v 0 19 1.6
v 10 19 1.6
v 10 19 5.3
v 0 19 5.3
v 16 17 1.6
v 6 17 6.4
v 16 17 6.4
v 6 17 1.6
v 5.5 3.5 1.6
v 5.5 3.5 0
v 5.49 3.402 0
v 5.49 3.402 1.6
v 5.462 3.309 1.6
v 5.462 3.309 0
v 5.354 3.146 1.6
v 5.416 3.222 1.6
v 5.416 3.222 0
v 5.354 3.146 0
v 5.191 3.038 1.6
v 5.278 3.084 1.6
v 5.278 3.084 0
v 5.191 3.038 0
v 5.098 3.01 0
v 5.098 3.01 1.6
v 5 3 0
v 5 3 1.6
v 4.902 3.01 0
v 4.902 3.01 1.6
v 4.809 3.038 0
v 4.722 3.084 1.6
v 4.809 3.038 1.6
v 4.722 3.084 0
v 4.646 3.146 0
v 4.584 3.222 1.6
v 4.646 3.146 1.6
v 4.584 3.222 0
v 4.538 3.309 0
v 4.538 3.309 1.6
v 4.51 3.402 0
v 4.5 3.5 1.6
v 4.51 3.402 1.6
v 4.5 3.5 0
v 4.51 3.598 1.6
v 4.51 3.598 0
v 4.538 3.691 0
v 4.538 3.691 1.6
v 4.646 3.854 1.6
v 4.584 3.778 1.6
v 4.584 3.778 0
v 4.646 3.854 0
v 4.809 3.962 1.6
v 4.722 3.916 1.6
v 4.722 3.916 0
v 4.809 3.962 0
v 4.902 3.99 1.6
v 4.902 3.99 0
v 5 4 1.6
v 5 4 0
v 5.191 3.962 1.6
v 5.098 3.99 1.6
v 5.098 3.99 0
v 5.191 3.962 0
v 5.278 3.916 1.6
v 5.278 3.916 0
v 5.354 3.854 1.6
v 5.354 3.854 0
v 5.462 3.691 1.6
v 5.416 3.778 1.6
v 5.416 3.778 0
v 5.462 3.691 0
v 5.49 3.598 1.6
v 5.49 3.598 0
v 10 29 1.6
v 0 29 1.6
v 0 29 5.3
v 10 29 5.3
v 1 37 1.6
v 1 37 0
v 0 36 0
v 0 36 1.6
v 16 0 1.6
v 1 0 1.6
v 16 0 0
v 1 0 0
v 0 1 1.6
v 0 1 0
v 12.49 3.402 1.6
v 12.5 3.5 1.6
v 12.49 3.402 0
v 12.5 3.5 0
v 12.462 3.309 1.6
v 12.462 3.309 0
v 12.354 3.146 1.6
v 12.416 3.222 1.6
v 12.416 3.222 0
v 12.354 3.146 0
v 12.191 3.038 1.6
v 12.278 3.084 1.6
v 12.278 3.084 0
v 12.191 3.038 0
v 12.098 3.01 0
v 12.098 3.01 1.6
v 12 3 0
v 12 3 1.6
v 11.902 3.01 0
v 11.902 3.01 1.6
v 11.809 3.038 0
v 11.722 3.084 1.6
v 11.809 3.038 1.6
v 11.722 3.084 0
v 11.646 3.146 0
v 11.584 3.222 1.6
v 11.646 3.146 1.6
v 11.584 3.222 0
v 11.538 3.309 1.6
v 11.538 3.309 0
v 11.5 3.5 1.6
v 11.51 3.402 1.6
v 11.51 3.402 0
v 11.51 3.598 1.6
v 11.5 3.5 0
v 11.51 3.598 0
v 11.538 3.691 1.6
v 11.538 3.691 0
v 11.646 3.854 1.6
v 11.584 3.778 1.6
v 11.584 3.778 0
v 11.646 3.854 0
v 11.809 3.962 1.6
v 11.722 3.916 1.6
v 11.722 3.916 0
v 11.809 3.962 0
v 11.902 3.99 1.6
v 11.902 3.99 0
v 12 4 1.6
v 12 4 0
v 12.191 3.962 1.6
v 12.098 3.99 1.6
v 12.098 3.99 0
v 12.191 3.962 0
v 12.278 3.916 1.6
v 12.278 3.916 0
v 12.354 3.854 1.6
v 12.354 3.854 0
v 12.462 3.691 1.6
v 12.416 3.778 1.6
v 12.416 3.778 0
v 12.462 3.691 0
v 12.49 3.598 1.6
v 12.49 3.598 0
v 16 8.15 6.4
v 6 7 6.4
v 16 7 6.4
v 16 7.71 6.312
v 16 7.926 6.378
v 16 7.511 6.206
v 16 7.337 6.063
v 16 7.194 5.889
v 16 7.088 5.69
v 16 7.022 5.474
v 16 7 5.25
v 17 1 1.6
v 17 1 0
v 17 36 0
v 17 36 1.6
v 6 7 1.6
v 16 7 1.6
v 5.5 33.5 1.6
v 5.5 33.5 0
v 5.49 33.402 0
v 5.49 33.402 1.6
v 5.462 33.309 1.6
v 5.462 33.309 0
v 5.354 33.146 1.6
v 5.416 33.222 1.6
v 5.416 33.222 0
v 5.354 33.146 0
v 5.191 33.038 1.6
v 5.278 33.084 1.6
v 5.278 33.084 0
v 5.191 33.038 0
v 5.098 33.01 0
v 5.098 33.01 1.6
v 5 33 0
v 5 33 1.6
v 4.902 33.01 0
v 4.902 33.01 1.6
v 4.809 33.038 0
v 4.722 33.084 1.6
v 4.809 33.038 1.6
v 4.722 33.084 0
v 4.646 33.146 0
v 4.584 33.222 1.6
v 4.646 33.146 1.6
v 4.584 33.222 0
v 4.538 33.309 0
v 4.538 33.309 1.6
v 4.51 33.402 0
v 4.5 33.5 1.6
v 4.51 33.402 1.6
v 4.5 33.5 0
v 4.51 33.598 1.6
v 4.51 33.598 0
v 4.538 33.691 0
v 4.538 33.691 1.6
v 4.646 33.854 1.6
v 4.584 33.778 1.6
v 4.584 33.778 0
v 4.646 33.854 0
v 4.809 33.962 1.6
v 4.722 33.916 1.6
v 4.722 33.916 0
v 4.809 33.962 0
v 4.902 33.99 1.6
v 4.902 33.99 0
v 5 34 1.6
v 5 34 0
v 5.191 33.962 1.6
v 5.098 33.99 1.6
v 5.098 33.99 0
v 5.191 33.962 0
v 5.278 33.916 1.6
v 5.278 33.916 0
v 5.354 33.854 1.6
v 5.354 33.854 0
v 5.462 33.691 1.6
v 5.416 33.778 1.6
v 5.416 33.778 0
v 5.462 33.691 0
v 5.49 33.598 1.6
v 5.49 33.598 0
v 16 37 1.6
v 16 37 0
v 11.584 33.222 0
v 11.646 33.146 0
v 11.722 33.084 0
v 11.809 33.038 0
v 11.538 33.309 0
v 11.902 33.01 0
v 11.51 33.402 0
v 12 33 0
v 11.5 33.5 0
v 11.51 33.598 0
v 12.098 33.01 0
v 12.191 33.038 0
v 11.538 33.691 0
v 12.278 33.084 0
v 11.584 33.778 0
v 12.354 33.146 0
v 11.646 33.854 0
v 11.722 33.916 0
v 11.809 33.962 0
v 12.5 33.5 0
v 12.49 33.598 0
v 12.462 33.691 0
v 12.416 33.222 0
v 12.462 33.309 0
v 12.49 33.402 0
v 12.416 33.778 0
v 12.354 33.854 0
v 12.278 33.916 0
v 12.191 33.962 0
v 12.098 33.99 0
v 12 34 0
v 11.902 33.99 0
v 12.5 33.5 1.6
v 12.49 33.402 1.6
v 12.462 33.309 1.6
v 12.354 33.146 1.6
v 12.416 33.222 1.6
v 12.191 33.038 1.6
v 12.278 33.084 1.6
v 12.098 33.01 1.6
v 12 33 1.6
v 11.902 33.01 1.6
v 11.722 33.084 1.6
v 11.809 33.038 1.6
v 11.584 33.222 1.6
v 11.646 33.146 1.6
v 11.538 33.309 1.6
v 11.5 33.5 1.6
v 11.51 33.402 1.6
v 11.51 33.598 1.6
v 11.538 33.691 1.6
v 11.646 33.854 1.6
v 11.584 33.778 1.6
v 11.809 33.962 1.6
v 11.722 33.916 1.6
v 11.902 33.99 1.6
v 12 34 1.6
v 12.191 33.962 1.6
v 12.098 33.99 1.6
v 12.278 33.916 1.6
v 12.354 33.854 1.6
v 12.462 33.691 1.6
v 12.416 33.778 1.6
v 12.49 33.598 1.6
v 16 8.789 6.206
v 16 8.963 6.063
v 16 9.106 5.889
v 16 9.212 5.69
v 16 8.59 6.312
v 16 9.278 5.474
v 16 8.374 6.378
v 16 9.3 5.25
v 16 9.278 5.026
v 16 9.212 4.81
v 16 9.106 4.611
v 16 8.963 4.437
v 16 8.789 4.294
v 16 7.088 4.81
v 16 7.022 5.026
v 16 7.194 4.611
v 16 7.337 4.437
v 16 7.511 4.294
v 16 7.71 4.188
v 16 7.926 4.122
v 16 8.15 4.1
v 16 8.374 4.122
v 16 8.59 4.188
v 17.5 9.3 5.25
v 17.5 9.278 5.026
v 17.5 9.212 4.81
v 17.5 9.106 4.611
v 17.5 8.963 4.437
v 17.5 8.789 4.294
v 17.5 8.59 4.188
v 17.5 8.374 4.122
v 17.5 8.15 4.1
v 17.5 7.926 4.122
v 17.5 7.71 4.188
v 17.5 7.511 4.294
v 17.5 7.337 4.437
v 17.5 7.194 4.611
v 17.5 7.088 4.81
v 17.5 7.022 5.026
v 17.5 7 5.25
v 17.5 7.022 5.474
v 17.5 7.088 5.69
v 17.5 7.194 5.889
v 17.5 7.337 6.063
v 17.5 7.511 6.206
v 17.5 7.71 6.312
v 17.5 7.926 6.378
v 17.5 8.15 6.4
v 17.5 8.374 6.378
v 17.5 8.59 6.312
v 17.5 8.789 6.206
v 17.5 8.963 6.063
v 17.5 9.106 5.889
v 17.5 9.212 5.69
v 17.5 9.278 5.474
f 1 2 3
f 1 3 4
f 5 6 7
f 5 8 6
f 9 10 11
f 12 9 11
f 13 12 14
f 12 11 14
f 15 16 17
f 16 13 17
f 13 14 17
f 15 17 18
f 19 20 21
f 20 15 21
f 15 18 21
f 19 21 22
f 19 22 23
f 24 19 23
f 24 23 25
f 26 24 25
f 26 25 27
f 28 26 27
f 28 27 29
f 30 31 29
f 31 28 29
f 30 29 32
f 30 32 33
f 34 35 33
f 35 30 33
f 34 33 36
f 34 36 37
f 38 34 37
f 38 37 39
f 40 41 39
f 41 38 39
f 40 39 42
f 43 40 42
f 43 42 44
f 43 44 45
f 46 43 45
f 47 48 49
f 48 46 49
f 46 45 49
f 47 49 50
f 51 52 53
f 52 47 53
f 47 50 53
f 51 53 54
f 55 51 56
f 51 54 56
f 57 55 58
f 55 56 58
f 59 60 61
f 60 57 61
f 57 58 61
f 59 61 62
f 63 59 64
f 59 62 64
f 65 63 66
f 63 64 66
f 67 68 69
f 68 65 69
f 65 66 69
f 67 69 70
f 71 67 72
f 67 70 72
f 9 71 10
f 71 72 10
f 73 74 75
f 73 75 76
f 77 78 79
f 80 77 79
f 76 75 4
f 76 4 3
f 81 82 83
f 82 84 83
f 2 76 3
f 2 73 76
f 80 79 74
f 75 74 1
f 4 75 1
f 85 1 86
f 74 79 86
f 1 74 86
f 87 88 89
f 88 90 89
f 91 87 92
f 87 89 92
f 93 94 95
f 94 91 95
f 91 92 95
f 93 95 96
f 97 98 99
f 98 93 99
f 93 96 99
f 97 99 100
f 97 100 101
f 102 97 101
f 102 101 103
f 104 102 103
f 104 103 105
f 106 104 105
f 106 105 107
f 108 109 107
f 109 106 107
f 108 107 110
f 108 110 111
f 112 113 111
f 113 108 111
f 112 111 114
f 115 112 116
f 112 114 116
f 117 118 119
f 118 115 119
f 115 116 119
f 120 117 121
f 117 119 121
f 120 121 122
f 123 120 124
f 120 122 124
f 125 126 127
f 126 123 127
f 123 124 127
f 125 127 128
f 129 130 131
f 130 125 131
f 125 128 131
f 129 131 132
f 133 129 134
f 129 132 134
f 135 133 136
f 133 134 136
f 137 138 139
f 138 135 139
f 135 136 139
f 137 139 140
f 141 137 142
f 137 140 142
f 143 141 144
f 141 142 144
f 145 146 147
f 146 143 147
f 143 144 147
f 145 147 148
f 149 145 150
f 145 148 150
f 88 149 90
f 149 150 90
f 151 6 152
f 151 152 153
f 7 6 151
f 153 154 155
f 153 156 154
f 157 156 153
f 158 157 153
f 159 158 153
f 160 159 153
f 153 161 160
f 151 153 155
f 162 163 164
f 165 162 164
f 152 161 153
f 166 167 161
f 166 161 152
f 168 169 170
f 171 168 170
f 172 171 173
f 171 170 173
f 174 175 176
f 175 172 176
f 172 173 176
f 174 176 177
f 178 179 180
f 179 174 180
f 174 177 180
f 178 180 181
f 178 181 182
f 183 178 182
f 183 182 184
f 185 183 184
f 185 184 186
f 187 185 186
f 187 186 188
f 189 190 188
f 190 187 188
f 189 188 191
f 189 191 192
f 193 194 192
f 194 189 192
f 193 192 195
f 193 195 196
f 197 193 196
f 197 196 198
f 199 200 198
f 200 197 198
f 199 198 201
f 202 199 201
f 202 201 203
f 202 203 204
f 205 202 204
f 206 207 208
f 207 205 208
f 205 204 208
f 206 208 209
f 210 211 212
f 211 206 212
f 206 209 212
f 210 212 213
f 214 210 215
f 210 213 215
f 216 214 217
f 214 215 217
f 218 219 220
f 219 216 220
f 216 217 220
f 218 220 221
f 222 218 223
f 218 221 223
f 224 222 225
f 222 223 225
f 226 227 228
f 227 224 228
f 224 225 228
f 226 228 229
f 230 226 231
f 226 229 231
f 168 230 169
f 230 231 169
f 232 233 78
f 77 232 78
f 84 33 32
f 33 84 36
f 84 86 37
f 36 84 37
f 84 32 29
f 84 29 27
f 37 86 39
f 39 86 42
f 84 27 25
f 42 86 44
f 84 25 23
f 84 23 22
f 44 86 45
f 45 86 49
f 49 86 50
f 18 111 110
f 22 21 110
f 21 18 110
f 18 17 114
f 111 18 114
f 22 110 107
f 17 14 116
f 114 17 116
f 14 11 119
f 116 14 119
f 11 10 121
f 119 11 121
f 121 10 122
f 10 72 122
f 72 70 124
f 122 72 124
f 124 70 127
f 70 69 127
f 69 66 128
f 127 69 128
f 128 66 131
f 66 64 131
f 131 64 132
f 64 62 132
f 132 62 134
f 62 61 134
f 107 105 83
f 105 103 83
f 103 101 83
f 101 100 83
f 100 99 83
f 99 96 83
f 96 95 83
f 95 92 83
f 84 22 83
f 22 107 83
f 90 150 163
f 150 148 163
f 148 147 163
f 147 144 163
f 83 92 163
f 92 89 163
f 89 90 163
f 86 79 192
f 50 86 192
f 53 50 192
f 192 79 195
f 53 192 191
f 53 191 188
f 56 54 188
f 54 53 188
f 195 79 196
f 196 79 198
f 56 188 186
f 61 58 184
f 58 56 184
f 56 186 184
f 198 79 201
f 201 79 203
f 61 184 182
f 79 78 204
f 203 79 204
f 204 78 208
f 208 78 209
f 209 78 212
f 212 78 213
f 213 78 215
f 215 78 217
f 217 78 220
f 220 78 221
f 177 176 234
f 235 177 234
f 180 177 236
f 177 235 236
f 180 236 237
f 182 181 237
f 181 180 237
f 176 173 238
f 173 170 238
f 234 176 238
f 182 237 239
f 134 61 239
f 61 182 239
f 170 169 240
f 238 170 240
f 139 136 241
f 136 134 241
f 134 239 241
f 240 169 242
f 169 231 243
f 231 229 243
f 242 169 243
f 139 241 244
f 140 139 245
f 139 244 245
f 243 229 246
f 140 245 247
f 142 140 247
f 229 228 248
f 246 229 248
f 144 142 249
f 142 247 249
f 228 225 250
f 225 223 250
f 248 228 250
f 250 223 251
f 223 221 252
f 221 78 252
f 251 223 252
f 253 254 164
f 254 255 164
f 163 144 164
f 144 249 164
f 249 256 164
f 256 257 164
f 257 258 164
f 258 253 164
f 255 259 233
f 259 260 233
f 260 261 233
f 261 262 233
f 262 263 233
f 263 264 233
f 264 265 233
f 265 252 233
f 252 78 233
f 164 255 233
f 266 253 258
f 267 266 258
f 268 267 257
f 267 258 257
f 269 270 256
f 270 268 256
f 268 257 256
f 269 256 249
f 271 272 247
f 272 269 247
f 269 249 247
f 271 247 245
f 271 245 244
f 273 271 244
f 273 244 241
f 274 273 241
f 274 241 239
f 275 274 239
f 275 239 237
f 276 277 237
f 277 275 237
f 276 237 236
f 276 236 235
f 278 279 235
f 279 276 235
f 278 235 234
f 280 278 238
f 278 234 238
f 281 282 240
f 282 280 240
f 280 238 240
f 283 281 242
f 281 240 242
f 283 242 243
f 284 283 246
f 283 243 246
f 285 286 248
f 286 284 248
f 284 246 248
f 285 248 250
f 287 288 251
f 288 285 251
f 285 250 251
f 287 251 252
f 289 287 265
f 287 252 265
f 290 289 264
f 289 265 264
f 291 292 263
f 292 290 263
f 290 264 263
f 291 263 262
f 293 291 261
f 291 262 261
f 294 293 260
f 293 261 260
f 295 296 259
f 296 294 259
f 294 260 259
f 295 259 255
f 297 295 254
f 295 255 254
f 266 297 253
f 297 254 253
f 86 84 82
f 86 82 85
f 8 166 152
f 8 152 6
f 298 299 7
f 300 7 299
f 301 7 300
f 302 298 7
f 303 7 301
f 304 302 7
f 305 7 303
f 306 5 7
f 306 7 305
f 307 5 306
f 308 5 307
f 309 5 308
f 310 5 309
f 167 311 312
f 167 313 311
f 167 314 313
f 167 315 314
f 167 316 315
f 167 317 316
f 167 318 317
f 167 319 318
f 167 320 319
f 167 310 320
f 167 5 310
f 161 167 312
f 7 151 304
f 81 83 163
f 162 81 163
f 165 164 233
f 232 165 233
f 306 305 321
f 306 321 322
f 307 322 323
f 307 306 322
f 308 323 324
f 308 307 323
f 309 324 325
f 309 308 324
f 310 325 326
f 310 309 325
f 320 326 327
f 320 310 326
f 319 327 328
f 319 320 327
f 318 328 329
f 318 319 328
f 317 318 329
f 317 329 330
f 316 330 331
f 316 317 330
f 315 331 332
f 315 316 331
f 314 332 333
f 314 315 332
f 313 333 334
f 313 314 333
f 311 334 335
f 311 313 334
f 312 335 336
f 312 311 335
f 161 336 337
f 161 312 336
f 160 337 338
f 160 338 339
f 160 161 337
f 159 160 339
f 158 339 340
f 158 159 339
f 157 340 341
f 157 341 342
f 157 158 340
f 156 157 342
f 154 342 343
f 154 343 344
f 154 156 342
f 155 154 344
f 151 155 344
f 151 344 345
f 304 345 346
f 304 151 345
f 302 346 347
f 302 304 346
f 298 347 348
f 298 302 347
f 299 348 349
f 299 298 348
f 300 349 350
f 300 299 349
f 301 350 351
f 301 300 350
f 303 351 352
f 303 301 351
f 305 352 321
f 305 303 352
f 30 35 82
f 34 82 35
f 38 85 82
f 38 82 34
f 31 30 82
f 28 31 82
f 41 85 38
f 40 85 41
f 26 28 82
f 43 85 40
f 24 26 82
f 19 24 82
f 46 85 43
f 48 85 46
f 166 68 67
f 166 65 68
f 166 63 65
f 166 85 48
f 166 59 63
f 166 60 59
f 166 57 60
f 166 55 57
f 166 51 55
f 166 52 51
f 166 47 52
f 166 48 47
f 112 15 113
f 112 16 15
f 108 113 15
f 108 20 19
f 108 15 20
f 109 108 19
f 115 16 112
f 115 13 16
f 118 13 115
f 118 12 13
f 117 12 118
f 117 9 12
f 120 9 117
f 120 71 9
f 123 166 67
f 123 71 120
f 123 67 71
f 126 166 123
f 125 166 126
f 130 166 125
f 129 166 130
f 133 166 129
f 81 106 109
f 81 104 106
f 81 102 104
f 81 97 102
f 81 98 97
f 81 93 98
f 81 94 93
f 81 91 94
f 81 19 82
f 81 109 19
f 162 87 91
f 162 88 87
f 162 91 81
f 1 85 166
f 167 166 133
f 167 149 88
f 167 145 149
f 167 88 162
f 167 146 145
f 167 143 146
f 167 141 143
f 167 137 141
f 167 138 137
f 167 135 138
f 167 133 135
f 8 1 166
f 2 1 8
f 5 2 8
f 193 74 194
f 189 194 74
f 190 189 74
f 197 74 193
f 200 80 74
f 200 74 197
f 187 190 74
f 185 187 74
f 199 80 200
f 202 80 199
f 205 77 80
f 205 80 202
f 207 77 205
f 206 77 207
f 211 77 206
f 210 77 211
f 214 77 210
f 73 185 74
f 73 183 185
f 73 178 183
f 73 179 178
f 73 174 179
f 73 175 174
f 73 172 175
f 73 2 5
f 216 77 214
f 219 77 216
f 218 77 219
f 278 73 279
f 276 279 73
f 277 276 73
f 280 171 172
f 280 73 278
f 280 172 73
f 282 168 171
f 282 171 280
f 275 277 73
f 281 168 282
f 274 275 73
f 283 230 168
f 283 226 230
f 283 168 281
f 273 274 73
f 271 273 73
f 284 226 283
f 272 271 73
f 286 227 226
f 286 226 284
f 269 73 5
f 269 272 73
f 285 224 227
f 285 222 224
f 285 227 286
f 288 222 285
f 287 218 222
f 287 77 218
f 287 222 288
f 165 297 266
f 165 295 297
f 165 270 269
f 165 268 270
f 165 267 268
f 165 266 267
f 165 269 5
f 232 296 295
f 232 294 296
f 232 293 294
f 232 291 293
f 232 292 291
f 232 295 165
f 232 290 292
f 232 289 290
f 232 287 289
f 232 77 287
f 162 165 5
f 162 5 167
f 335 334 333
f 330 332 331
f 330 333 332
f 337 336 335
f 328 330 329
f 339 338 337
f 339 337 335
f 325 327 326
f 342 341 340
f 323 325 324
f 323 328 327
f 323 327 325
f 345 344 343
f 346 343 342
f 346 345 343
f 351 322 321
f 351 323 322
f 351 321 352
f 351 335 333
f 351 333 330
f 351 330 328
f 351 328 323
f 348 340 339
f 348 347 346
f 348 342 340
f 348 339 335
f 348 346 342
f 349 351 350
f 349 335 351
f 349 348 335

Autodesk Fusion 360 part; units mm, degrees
sketch "Skizze1" plane through (0, 0, 0) normal (0, 0, 1) x (1, 0, 0)
  line L0 (2.5, 0) -> (15.28, 0)
  line L1 (17.78, 2.5) -> (17.78, 16.55)
  line L2 (15.28, 19.05) -> (2.5, 19.05)
  line L3 (0, 16.55) -> (0, 2.5)
  arc A0 (2.5, 19.05) -> (0, 16.55) centre (2.5, 16.55) ccw
  arc A1 (17.78, 16.55) -> (15.28, 19.05) centre (15.28, 16.55) ccw
  arc A2 (15.28, 0) -> (17.78, 2.5) centre (15.28, 2.5) ccw
  arc A3 (0, 2.5) -> (2.5, 0) centre (2.5, 2.5) ccw
  circle A4 centre (2.5, 16.55) radius 1
  circle A5 centre (15.2, 16.55) radius 1
  circle A6 centre (0.89, 2.5) radius 0.5
  circle A7 centre (3.5567, 2.5) radius 0.5
  circle A8 centre (6.2233, 2.5) radius 0.5
  circle A9 centre (8.89, 2.5) radius 0.5
  circle A10 centre (11.5567, 2.5) radius 0.5
  circle A11 centre (14.2233, 2.5) radius 0.5
  circle A12 centre (16.89, 2.5) radius 0.5
  point P0 (17.78, 0)
  dimension "d3" = 17.78
  dimension "d4" = 19.05
  dimension "d5" = 2.5
  dimension "d6" = 2
  dimension "d9" = 12.7
  dimension "d10" = 0
  dimension "d11" = 1
  dimension "d12" = 2.5
  dimension "d15" = 16
  dimension "d16" = 0
  dimension "d17" = 8.89
extrude "Extrusion1" add sketch "Skizze1" along normal blind 1.6

Autodesk Fusion 360 part; units mm, degrees
sketch "Skizze1" plane through (0, 0, 0) normal (0, 0, 1) x (1, 0, 0)
  line L0 (1, 0) -> (16, 0)
  line L1 (17, 1) -> (17, 36)
  line L2 (16, 37) -> (1, 37)
  line L3 (0, 36) -> (0, 1)
  circle A0 centre (5, 33.5) radius 0.5
  circle A1 centre (12, 33.5) radius 0.5
  circle A2 centre (5, 3.5) radius 0.5
  circle A3 centre (12, 3.5) radius 0.5
  line L4 (0, 29) -> (10, 29)
  line L5 (10, 29) -> (10, 19)
  line L6 (10, 19) -> (0, 19)
  line L7 (0, 19) -> (0, 29)
  line L8 (16, 7) -> (6, 7)
  line L9 (6, 7) -> (6, 17)
  line L10 (6, 17) -> (16, 17)
  line L11 (16, 17) -> (16, 7)
  line L12 (1, 37) -> (0, 36)
  line L13 (17, 36) -> (16, 37)
  line L14 (1, 0) -> (0, 1)
  line L15 (16, 0) -> (17, 1)
  point P0 (17, 0)
  point P1 (17, 37)
  point P2 (0, 37)
  dimension "d1" = 17
  dimension "d2" = 37
  dimension "d3" = 1
  dimension "d4" = 5
  dimension "d5" = 3.5
  dimension "d8" = 7
  dimension "d9" = -30
  dimension "d10" = 10
  dimension "d11" = 10
  dimension "d12" = 8
  dimension "d13" = 10
  dimension "d14" = 10
  dimension "d15" = 7
  dimension "d16" = 1
  dimension "d28" = 1
  dimension "d29" = 1
  dimension "d30" = 1
  dimension "d31" = 1
  dimension "d32" = 1
  dimension "d33" = 1
  dimension "d34" = 1
  dimension "d35" = 1
extrude "Extrusion1" add sketch "Skizze1" along normal blind 1.6 contours L0 L1 L2 L3 L4 L5 L6 L12 L13 L14 L15
extrude "Extrusion2" add sketch "Skizze1" along normal blind 5.3 contours L3 L4 L5 L6 L7
extrude "Extrusion3" add sketch "Skizze1" along normal blind 6.4 contours L8 L9 L10 L11
sketch "Skizze2" plane through (16, 0, 0) normal (1, 0, 0) x (0, 1, 0)
  line L0 (17, 1.6) -> (17, 6.4)
  line L1 (17, 6.4) -> (7, 6.4)
  line L2 (7, 6.4) -> (7, 1.6)
  circle A0 centre (8.15, 5.25) radius 1.15
  line L3 (7, 1.6) -> (17, 1.6)
  dimension "d23" = 2.3
  dimension "d24" = 1.15
  dimension "d25" = 1.15
extrude "Extrusion4" add sketch "Skizze2" along normal blind 1.5 contours A0
equation "d29 = d28"
equation "d31 = d30"
equation "d33 = d32"
equation "d35 = d34"
